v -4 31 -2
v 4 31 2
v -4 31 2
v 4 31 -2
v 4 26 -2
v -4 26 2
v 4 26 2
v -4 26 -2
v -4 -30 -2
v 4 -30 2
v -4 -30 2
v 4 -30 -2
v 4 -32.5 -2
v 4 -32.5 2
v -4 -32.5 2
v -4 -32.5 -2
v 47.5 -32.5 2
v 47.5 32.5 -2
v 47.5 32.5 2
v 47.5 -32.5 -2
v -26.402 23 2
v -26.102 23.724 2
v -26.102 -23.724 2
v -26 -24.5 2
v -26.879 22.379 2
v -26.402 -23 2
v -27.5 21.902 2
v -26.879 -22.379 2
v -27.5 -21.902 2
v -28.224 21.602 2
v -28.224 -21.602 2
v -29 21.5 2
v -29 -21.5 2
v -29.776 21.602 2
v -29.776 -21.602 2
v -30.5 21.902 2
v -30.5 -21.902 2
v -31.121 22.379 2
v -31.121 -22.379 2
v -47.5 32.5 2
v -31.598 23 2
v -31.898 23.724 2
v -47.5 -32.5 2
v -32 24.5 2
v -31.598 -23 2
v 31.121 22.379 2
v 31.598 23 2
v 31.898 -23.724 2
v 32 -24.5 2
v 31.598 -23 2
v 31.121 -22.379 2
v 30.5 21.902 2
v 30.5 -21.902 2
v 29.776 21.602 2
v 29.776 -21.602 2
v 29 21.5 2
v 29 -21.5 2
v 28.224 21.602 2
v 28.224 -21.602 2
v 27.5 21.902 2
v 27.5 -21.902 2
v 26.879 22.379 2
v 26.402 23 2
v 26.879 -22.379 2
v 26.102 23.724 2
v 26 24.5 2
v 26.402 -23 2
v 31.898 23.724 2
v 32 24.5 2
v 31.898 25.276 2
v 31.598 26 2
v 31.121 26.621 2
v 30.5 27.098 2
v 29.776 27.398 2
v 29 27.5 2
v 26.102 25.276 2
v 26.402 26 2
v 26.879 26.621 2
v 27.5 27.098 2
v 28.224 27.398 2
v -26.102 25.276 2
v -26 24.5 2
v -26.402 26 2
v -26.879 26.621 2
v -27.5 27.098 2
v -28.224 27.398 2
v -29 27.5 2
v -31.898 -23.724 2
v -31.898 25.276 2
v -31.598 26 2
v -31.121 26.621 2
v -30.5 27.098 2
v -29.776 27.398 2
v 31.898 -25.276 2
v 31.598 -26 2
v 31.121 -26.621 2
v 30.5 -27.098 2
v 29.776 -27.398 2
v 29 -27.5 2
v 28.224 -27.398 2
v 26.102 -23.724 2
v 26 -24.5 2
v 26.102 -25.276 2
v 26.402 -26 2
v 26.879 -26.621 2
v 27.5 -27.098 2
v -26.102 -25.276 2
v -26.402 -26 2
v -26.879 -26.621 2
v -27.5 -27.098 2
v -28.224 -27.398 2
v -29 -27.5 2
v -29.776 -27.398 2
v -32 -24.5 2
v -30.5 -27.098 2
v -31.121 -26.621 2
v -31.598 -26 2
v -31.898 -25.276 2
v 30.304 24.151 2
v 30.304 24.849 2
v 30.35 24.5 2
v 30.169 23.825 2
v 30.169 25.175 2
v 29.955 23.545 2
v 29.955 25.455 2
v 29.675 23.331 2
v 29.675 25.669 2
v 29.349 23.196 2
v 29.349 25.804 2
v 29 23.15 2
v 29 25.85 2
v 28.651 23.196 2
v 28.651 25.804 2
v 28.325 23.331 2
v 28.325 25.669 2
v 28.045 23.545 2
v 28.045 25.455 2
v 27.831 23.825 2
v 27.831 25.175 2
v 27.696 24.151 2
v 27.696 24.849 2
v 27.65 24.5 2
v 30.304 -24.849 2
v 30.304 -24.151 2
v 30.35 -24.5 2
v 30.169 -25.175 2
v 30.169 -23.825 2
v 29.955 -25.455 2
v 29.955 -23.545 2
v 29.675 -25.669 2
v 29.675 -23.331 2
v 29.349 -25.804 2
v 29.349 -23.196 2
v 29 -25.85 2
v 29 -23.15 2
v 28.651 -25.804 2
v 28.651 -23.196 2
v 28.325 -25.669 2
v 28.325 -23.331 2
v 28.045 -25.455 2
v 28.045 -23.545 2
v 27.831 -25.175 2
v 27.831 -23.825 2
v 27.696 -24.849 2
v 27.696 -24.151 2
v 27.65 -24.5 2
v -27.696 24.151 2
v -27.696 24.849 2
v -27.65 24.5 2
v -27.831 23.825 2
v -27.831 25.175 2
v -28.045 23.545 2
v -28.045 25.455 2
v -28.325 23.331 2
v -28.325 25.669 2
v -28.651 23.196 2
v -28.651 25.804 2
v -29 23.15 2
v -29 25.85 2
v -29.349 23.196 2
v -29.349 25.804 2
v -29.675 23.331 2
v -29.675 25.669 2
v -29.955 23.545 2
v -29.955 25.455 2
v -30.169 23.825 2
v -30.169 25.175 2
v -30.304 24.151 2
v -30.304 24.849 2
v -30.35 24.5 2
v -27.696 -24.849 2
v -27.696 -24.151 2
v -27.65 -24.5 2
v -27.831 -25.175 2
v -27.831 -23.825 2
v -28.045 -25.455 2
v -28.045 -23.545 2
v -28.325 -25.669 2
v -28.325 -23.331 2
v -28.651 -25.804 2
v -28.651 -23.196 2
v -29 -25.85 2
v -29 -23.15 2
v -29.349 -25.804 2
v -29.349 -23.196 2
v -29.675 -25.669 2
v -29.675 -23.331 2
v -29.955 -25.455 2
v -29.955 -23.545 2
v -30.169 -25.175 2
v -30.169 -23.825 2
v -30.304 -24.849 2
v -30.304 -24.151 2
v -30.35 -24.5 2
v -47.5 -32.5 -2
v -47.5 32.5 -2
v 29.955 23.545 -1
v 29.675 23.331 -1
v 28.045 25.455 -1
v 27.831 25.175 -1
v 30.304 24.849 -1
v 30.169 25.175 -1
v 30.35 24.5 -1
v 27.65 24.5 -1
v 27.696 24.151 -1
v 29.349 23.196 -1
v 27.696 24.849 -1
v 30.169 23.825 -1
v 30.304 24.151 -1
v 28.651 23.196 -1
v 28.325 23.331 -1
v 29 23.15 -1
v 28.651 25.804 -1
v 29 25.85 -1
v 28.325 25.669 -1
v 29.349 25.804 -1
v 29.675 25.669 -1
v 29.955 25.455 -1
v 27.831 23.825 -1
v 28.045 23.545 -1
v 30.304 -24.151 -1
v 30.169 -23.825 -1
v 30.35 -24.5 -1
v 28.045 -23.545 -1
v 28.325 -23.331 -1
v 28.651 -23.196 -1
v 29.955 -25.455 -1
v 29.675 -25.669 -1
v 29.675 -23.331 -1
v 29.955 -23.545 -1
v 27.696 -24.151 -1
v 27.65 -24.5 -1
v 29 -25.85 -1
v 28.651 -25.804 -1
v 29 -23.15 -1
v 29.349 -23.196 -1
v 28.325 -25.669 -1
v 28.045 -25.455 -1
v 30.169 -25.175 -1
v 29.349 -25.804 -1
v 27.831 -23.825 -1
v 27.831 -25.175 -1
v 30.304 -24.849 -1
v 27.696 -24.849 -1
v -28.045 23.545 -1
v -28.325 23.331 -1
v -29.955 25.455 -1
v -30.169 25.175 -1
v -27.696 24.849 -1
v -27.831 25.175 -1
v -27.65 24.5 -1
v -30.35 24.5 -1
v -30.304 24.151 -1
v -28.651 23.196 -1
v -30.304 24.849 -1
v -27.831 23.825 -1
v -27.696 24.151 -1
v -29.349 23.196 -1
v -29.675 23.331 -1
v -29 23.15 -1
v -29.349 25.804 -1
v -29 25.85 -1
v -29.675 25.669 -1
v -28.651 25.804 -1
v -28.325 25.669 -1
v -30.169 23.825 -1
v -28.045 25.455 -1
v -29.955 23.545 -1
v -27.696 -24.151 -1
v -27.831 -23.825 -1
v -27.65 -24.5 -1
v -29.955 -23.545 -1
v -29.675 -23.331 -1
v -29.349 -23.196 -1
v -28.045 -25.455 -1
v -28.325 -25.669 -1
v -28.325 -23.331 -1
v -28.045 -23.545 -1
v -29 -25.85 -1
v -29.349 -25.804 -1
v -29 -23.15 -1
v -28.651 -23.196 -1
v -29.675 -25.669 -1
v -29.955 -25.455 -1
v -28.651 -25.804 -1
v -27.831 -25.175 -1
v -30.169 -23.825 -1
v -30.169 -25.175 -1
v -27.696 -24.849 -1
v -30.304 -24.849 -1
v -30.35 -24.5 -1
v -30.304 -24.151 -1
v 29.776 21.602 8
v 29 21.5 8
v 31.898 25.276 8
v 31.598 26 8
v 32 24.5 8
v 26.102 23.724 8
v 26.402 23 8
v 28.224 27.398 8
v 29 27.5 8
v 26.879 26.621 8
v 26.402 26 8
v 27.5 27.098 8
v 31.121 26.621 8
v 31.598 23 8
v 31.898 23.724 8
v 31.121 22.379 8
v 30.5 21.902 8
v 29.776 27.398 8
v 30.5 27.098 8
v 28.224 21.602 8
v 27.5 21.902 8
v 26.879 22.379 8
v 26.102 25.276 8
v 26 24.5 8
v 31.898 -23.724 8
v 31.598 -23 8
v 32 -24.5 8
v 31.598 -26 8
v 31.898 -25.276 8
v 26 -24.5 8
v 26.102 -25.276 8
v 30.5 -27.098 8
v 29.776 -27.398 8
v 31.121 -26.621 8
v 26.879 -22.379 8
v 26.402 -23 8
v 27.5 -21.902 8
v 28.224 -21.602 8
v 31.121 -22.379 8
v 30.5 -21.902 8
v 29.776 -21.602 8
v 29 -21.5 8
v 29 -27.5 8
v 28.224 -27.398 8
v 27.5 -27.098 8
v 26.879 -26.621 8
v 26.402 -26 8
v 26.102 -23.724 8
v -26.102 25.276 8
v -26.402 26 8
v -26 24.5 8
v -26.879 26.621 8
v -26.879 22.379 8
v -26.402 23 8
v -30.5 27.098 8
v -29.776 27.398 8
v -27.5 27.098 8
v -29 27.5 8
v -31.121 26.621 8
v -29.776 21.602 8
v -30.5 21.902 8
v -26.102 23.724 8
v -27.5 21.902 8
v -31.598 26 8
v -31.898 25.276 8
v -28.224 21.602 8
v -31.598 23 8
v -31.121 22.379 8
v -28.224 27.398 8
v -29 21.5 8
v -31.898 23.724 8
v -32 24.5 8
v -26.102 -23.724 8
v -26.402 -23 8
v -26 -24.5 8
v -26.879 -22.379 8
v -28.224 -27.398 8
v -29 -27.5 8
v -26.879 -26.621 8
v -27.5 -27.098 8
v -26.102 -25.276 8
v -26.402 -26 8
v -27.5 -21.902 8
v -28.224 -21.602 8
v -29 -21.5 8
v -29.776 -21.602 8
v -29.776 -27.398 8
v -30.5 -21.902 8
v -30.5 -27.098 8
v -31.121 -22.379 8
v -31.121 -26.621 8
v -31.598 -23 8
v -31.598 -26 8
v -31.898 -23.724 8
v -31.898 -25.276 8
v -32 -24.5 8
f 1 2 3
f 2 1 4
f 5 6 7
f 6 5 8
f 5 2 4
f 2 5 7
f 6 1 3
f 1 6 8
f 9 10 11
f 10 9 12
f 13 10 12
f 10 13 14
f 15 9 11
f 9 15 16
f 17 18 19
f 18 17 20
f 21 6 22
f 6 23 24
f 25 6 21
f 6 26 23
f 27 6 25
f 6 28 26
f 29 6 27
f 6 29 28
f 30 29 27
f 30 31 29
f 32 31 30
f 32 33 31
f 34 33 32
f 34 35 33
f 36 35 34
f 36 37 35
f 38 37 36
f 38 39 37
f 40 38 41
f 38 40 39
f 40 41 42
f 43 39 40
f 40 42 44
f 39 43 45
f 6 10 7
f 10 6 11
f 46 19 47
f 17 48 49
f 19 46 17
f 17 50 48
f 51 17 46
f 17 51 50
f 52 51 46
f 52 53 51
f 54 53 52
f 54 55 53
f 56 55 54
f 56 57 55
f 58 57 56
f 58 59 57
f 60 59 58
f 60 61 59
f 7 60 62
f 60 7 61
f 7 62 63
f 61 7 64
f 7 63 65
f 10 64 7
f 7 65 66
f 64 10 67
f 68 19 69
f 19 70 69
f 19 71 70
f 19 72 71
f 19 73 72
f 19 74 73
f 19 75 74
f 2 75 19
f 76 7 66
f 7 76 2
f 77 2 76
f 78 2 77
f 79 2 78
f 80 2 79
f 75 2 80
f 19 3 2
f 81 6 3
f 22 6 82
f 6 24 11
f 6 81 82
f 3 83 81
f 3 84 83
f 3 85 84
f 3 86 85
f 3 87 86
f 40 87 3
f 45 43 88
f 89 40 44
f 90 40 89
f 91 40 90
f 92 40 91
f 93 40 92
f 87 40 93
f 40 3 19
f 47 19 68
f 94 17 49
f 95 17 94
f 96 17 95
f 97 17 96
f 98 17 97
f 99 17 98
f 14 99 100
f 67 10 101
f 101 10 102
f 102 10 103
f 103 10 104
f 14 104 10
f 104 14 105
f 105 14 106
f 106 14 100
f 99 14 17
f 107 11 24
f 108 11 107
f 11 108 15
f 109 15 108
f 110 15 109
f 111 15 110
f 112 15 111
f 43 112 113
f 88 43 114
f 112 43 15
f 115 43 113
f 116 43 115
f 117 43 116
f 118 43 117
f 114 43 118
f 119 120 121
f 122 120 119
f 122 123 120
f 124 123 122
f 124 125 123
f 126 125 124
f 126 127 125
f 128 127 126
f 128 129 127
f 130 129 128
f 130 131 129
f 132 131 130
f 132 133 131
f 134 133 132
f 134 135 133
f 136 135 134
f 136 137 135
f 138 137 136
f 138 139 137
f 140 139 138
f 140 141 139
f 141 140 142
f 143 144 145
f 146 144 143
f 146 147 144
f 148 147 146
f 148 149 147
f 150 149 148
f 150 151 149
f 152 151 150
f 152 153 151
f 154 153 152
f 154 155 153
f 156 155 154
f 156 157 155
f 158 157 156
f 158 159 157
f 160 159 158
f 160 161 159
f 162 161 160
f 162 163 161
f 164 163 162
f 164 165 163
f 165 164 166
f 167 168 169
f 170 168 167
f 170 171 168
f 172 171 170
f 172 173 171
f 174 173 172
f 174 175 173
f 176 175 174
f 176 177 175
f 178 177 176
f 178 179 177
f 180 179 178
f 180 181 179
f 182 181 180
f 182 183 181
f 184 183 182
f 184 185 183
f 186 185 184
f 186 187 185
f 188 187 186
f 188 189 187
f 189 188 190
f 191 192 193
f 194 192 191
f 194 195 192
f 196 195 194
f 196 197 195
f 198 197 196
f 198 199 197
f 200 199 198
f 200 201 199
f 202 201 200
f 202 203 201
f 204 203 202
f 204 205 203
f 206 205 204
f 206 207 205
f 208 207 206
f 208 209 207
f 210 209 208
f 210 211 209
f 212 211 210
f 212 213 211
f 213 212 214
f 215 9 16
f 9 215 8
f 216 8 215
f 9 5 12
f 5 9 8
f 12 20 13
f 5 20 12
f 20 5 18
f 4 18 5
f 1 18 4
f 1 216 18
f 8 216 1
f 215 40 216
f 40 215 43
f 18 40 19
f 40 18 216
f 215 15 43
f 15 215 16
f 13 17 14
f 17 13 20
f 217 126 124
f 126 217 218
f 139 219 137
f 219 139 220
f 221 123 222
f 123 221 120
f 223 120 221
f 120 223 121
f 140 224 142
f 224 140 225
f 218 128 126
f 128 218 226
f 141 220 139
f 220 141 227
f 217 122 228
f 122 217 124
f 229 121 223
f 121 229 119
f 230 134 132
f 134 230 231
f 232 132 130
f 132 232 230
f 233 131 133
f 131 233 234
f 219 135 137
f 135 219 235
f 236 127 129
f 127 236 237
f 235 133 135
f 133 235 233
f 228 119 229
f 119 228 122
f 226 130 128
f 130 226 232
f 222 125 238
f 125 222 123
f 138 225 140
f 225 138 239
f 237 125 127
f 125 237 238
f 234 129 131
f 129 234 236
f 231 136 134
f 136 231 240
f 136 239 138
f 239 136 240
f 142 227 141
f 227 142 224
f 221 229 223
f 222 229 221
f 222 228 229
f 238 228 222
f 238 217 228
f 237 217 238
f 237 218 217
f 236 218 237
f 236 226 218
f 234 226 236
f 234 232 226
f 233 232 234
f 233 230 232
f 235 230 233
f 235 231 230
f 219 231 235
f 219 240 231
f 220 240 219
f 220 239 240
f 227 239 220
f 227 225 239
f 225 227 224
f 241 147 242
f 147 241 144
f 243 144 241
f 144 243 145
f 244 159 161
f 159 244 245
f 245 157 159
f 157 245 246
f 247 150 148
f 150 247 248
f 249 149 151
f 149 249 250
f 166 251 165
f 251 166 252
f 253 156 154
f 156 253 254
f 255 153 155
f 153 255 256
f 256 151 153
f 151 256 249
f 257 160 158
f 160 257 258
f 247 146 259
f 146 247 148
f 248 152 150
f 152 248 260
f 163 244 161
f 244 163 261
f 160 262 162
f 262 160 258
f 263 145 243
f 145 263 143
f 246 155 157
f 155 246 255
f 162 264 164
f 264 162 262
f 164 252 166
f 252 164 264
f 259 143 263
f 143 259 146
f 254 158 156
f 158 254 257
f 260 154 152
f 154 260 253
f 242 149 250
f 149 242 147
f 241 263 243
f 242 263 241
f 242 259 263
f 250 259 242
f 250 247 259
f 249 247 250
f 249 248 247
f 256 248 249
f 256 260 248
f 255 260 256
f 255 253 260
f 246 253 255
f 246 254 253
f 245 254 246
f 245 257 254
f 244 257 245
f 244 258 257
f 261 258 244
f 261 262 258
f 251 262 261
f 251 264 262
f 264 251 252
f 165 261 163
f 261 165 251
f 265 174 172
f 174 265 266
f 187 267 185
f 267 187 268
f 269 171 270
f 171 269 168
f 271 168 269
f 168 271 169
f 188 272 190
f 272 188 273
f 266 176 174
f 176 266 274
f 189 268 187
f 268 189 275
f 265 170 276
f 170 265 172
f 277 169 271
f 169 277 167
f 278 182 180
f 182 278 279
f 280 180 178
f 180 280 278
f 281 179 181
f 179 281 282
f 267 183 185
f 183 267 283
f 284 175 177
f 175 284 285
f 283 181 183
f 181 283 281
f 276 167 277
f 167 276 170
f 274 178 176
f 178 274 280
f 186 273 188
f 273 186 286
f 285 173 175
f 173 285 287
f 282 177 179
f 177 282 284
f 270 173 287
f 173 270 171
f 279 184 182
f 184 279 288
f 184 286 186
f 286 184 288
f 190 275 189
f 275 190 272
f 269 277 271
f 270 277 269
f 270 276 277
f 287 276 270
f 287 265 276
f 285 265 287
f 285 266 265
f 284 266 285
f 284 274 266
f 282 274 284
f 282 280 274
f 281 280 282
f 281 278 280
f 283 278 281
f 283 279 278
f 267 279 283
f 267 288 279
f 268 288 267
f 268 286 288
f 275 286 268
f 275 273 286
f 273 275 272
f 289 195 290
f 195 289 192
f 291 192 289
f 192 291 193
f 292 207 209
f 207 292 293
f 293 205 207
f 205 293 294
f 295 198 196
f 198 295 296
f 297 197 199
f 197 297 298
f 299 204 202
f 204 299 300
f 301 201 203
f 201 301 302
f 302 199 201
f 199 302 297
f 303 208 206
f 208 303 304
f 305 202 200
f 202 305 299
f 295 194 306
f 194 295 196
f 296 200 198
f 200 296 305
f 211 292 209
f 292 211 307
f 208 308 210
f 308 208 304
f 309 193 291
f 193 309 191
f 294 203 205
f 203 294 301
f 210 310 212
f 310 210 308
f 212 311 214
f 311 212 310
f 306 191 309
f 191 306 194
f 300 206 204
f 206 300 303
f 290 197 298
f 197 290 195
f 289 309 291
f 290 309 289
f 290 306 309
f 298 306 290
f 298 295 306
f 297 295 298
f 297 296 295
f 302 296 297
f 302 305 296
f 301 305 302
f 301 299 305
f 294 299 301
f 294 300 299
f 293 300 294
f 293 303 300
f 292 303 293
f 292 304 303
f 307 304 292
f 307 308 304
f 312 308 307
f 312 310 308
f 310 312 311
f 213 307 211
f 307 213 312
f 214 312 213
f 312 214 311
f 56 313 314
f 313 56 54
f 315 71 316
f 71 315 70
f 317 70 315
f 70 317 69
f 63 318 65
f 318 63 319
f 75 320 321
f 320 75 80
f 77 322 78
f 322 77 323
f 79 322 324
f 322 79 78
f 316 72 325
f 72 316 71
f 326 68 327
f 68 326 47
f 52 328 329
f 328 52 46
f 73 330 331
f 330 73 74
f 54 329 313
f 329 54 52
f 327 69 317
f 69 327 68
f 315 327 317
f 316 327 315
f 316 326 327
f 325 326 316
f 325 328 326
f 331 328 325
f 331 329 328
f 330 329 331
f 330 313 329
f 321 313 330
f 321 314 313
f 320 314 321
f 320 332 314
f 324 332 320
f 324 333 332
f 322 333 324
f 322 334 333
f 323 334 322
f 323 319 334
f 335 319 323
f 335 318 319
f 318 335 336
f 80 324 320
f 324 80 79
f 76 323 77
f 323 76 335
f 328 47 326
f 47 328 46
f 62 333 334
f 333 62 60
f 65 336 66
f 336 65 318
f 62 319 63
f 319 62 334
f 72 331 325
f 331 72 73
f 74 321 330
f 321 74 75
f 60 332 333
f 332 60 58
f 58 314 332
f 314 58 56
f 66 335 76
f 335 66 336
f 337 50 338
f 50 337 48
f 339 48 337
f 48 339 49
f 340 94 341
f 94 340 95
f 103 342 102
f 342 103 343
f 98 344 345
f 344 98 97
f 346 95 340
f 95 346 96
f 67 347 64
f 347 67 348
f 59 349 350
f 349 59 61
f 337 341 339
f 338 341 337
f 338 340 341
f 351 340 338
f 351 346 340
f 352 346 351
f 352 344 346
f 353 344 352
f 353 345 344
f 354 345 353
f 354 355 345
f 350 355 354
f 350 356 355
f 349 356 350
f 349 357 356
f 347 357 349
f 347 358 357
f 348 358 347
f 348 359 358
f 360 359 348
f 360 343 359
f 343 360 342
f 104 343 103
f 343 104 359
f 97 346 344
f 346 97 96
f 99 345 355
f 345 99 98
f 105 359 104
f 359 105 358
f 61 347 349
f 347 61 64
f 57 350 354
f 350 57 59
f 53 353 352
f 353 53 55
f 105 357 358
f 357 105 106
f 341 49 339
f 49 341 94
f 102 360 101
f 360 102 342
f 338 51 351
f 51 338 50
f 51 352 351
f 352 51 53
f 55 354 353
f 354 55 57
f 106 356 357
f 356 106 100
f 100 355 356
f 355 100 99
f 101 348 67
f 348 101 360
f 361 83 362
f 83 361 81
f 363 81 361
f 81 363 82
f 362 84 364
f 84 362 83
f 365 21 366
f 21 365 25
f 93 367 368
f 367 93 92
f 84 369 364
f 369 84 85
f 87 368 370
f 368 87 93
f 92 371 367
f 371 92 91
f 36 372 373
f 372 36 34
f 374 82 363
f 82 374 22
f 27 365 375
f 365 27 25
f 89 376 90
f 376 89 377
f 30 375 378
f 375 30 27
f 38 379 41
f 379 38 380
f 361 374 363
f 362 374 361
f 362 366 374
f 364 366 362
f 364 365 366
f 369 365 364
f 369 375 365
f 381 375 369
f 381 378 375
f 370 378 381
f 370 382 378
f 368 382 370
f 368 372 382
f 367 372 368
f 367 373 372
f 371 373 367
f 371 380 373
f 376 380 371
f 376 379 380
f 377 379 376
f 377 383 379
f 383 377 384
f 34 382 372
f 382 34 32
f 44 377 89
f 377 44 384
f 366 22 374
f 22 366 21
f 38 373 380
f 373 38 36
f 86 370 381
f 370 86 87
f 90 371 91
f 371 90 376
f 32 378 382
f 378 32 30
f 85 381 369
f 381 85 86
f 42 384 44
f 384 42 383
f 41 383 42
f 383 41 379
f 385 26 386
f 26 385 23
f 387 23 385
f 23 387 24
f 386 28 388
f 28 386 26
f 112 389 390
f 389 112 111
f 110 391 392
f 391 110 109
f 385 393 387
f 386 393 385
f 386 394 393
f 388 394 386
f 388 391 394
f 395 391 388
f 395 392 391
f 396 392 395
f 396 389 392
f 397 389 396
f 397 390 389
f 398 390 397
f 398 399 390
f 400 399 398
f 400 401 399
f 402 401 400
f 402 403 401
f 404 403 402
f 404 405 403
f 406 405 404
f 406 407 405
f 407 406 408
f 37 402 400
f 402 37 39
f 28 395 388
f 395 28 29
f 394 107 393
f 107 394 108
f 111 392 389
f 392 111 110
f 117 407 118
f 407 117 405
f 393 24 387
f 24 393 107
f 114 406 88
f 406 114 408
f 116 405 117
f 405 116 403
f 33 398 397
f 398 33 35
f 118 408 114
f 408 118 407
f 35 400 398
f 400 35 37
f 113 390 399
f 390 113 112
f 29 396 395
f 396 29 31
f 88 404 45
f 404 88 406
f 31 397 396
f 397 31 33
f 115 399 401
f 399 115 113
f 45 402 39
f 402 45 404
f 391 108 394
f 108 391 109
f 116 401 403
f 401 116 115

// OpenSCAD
$fn = 24;

module standoff() {
    cylinder(h = 6, r = 3);
}

module keyhole_slot() {
    union() {
        // Circular top of keyhole
        translate([0, 0, -0.5])
            cylinder(h = 5, r = 4);
        // Rectangular stem
        translate([-4, -7, -0.5])
            cube([8, 7, 5]);
    }
}

module base_plate() {
    difference() {
        // Main base plate: 95 × 65 × 4 mm
        cube([95, 65, 4], center = true);
        
        // Four M2.5 clearance holes (2.7 mm diameter) at mounting positions
        // Mounting hole pattern: 58 mm × 49 mm centers, relative to board center
        // Pi 5 board center at (85/2, 56/2) = (42.5, 28)
        // Hole positions offset from board center
        translate([29, 24.5, -1])
            cylinder(h = 6, r = 1.35);
        translate([29, -24.5, -1])
            cylinder(h = 6, r = 1.35);
        translate([-29, 24.5, -1])
            cylinder(h = 6, r = 1.35);
        translate([-29, -24.5, -1])
            cylinder(h = 6, r = 1.35);
        
        // Two wall-mount keyhole slots (8 mm wide × 14 mm long)
        // Near the short edges (top and bottom when mounted)
        translate([0, 30.5, 3.5])
            rotate([90, 0, 0])
            keyhole_slot();
        translate([0, -30.5, 3.5])
            rotate([90, 0, 0])
            keyhole_slot();
    }
}

module standoffs_positive() {
    // Four standoffs at mounting hole positions
    translate([29, 24.5, 2])
        standoff();
    translate([29, -24.5, 2])
        standoff();
    translate([-29, 24.5, 2])
        standoff();
    translate([-29, -24.5, 2])
        standoff();
}

// Final assembly
union() {
    base_plate();
    standoffs_positive();
}
